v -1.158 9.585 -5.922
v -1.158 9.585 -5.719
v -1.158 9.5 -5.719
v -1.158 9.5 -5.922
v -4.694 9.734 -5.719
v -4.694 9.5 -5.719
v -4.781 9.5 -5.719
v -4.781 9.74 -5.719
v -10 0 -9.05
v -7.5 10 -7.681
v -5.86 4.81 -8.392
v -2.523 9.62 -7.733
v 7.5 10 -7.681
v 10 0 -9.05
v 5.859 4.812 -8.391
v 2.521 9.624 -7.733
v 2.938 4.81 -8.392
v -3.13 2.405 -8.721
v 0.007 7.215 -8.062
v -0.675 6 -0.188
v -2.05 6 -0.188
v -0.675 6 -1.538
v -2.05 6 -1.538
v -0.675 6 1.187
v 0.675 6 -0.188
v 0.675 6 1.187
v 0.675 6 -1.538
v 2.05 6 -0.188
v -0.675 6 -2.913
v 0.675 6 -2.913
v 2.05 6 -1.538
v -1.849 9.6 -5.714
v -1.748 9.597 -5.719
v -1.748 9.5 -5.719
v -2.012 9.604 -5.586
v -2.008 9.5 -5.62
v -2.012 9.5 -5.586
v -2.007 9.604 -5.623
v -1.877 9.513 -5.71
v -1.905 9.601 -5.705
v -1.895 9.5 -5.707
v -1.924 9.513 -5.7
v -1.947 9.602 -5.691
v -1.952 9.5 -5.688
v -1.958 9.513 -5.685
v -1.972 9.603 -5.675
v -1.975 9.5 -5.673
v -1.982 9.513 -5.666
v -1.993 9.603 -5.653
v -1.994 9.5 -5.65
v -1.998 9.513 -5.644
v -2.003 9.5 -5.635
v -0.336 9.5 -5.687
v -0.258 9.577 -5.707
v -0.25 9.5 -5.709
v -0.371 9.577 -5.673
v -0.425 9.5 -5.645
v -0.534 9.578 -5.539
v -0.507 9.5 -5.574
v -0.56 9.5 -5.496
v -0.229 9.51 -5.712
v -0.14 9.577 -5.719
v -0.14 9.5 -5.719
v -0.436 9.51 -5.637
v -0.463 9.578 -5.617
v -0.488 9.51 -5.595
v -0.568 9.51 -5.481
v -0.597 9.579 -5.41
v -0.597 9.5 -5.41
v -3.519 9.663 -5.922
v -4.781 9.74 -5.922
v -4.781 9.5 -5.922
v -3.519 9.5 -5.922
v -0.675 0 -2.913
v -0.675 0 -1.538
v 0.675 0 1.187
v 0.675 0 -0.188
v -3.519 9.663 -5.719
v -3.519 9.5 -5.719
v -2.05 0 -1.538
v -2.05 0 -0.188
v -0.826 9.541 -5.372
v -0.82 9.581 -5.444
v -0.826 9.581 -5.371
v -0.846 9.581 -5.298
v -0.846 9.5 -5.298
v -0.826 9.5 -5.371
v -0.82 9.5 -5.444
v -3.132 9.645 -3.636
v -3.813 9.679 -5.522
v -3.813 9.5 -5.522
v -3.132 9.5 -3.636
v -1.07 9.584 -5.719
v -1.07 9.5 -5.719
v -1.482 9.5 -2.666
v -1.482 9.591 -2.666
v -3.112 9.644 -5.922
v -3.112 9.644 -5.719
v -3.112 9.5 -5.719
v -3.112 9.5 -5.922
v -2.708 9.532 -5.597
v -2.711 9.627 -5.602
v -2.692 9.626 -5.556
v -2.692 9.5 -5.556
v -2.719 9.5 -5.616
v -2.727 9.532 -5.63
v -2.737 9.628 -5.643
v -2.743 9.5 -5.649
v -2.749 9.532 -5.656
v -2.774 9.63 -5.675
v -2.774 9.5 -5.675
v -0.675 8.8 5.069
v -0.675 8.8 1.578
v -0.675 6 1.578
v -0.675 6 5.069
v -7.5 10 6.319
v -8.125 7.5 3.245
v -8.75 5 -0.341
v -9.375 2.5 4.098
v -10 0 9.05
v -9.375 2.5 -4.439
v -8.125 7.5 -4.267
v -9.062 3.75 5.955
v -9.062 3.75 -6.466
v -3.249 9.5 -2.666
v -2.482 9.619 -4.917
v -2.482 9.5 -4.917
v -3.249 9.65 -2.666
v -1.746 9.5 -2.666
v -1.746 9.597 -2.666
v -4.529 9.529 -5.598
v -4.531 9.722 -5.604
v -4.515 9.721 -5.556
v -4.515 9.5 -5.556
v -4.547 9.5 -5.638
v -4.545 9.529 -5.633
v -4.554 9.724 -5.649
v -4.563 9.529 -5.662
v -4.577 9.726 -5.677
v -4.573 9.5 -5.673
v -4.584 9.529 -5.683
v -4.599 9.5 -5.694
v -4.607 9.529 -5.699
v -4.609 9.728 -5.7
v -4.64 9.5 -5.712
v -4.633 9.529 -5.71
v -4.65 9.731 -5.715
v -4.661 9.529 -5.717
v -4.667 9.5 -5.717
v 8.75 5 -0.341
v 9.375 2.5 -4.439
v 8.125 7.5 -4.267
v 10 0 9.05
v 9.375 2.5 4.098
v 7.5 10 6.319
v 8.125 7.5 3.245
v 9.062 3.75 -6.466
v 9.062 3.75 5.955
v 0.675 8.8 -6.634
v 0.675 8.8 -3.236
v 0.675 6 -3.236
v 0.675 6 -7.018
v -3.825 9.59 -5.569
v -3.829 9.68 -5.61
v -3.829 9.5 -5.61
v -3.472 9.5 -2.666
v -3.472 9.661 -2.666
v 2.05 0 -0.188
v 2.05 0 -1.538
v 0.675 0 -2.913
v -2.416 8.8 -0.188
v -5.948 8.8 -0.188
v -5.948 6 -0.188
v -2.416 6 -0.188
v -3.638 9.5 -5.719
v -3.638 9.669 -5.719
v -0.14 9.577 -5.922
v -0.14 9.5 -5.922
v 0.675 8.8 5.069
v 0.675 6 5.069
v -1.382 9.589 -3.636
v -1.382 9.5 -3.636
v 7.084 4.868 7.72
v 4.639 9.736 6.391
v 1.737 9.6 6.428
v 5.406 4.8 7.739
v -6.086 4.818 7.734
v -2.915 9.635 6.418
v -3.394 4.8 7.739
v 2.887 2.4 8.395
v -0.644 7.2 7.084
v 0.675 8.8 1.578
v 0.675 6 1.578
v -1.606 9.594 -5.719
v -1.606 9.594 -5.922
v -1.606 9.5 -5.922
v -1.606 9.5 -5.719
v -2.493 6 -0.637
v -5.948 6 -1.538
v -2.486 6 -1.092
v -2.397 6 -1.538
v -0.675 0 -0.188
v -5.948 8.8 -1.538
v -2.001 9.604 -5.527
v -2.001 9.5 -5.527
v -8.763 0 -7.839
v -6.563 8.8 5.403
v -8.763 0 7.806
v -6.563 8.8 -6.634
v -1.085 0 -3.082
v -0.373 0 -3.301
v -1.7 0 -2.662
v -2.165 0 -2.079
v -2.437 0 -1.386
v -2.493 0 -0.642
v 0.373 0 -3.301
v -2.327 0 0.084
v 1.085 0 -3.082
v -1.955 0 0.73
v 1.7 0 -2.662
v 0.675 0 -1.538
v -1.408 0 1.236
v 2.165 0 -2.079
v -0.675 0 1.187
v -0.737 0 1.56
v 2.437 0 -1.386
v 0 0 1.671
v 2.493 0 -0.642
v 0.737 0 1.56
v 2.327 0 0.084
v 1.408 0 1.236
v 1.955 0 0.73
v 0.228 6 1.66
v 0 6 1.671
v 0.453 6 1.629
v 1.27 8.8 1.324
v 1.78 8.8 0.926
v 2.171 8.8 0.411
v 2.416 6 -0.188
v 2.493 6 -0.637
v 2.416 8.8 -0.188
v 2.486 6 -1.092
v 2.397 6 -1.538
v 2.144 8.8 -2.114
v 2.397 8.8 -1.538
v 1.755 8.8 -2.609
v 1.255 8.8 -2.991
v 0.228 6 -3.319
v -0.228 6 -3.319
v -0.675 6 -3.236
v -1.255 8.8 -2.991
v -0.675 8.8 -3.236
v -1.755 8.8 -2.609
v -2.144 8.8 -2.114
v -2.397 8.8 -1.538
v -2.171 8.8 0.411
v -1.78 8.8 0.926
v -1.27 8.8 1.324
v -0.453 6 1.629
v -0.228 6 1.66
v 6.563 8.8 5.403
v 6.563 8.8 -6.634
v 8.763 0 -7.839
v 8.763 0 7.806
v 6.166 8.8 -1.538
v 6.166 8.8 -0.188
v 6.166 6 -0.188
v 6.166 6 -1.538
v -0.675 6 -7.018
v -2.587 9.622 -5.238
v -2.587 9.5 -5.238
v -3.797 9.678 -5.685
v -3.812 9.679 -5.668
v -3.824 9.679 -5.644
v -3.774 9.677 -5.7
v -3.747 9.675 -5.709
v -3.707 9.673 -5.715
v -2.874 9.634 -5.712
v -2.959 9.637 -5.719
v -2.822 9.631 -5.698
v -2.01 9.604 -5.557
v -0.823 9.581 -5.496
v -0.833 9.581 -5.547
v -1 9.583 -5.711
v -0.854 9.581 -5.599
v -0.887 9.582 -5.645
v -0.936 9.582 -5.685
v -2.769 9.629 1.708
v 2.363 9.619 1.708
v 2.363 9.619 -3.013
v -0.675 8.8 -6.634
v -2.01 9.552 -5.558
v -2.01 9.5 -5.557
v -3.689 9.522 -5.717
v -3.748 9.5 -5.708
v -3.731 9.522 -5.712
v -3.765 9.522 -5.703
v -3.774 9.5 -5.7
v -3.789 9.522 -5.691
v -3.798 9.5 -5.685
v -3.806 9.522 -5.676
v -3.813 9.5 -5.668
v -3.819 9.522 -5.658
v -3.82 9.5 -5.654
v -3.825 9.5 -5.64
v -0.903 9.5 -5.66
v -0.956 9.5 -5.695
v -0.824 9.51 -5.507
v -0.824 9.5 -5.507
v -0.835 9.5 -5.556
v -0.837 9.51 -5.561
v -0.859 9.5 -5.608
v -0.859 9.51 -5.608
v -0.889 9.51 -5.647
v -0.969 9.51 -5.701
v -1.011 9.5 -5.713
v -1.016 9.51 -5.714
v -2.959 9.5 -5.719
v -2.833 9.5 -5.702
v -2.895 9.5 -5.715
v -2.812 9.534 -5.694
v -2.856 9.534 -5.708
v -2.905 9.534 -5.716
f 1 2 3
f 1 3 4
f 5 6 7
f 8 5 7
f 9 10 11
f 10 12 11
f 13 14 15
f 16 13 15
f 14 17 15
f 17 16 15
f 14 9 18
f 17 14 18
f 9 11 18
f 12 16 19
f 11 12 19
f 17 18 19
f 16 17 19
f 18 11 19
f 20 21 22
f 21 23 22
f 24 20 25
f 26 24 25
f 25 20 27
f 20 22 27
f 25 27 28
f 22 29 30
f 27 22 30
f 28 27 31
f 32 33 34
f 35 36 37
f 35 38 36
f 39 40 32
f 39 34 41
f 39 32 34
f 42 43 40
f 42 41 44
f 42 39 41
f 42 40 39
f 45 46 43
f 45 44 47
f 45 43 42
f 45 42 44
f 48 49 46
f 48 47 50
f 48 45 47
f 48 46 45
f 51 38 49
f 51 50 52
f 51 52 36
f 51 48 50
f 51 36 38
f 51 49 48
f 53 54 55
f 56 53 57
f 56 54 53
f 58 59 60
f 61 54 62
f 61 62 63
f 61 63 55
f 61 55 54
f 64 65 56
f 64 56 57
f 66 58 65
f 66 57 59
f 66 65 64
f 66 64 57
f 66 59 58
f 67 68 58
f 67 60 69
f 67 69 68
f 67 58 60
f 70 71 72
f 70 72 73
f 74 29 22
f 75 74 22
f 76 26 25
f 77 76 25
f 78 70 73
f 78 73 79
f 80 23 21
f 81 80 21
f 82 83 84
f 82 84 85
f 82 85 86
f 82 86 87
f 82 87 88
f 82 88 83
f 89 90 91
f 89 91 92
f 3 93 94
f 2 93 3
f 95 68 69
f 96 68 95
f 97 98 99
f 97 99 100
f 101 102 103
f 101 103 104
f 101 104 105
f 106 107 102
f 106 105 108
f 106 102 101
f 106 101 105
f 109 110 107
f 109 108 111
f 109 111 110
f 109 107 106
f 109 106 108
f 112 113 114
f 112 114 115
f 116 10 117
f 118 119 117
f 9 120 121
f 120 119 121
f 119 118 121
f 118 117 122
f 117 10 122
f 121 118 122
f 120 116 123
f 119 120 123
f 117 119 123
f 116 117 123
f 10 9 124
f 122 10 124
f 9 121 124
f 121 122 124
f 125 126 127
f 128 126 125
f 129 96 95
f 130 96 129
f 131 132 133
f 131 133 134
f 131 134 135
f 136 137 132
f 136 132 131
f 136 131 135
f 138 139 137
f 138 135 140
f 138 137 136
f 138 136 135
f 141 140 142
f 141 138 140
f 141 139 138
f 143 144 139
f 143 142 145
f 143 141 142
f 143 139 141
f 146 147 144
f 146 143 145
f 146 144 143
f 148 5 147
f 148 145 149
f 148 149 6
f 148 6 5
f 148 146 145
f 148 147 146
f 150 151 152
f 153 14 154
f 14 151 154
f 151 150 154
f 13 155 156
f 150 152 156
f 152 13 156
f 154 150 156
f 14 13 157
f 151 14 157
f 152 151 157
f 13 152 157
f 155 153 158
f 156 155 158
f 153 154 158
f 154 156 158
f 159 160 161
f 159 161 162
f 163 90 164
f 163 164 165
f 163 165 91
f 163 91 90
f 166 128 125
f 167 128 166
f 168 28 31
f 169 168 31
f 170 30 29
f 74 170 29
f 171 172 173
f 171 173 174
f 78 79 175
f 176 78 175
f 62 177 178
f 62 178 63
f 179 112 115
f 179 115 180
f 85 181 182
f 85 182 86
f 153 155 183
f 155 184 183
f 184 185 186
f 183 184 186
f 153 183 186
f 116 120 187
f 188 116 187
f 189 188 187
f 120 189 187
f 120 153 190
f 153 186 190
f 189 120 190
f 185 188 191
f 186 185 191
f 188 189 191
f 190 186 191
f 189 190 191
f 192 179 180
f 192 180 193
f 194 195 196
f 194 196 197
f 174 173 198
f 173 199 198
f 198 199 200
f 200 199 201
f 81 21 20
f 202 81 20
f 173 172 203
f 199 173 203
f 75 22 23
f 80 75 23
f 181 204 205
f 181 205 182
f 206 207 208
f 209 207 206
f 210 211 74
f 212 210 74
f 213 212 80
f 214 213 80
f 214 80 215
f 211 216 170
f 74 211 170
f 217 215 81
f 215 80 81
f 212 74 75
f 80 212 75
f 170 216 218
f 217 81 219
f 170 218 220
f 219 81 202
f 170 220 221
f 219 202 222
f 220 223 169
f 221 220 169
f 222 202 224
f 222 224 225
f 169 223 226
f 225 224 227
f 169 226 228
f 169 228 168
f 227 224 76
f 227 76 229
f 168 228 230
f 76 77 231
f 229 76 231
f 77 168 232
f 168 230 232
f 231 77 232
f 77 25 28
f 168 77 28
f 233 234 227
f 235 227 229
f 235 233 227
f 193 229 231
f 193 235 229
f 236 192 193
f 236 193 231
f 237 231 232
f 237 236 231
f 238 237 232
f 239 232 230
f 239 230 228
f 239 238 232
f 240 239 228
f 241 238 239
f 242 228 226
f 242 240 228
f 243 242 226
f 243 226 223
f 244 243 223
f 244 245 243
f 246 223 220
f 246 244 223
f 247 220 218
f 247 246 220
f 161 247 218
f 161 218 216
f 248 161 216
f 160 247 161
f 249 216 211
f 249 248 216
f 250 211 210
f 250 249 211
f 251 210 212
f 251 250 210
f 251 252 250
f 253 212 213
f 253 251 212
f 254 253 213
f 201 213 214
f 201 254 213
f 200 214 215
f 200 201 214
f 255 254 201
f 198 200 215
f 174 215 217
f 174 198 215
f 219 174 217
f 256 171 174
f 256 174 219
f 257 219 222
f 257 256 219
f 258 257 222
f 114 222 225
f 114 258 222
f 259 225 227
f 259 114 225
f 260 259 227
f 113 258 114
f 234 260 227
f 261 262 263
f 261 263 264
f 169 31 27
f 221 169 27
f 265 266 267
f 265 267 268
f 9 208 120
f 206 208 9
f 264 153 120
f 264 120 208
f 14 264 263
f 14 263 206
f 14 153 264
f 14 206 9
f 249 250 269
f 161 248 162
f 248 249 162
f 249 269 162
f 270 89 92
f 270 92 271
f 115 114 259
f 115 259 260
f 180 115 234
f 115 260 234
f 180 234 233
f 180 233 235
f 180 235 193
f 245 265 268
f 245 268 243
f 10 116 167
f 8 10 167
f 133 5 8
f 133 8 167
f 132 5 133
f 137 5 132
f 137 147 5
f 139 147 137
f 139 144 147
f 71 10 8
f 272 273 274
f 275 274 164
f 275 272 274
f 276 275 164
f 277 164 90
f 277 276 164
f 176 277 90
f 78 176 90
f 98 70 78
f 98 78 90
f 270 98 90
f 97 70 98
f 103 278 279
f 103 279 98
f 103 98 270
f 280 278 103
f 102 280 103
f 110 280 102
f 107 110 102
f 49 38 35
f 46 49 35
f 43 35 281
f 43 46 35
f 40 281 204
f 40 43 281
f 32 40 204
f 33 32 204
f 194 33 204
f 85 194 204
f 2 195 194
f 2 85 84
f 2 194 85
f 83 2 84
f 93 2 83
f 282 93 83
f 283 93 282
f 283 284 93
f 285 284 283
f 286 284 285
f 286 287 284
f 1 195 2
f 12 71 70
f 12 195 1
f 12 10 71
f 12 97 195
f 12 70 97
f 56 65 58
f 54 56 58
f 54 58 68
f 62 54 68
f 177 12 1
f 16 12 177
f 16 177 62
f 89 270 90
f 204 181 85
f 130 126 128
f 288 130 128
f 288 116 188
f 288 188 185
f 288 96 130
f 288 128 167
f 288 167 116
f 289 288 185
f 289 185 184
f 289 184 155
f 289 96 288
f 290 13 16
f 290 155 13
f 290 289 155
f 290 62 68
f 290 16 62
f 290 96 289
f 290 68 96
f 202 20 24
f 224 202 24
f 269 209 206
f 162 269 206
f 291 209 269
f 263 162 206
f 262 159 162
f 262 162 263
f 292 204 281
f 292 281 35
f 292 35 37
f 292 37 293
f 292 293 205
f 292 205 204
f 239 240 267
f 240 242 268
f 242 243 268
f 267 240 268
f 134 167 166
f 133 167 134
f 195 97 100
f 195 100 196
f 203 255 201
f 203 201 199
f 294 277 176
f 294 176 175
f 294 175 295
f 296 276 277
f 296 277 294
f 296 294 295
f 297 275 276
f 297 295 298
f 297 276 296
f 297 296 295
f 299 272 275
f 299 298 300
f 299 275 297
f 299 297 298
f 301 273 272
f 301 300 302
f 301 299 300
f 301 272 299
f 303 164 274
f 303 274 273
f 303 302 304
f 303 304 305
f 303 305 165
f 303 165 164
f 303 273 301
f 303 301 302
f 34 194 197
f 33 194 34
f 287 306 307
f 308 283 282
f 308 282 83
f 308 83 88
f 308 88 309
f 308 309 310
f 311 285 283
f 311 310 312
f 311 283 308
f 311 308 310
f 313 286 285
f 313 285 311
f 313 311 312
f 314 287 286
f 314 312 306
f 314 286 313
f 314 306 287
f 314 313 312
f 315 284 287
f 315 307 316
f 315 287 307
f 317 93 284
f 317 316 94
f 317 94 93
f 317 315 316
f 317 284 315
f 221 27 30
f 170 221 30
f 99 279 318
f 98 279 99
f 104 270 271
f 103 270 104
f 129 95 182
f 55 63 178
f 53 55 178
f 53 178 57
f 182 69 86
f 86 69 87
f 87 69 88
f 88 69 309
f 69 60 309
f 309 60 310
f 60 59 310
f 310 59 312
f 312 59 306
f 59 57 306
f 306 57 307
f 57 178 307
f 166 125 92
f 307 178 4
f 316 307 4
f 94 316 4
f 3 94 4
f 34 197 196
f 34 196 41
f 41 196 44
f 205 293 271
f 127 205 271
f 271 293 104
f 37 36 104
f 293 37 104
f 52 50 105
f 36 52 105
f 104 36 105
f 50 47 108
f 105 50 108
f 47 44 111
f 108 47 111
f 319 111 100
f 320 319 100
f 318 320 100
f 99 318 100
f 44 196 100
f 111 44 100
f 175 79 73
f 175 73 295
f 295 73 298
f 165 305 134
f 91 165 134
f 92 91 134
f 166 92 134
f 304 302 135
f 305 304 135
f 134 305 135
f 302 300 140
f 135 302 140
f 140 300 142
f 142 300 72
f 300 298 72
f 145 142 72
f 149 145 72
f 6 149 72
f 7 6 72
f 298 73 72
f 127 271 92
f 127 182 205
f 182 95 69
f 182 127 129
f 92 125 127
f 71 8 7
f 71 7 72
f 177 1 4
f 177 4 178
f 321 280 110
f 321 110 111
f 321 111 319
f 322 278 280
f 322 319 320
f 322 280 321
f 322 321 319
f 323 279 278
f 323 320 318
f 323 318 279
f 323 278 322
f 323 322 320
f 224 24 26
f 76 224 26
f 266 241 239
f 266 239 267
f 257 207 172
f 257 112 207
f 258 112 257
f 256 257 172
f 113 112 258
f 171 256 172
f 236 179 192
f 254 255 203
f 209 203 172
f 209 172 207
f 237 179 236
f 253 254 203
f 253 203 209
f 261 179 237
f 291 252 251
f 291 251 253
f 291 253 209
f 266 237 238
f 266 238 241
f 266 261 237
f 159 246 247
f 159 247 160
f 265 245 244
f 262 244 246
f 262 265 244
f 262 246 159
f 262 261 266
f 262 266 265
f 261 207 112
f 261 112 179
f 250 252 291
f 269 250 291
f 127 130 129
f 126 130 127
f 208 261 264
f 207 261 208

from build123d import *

# Parameters (mm, degrees)
SHELL1_T                = -1.2
SKETCH5_W               = 1.35
SKETCH5_H               = 5.256968873
SKETCH5_H_2             = 1.35
SKETCH5_W_2             = 5.491330354
SKETCH5_W_3             = 5.273072972
SKETCH5_H_3             = 5.618351113
BOSS_EXTRUDE1_DEPTH     = 4
SKETCH6_R               = 2.5
BOSS_EXTRUDE2_DEPTH     = 10
CUT_EXTRUDE3_DEPTH      = 10
CUT_EXTRUDE3_DEPTH_BACK = 10
CUT_EXTRUDE4_DEPTH      = 0.5


with BuildPart() as part:
    # Loft1: read off the stored shape, not the designer's step
    # Loft1: loft between two sections, ruled curve by curve
    loft1_from = [
        Edge.make_line((-10, 0, 9.05), (-10, 0, -9.05)),
        Edge.make_line((-10, 0, -9.05), (10, 0, -9.05)),
        Edge.make_line((10, 0, 9.05), (-10, 0, 9.05)),
        Edge.make_line((10, 0, -9.05), (10, 0, 9.05)),
    ]
    loft1_to = [
        Edge.make_line((-7.5, 10, 6.318777005), (-7.5, 10, -7.681222995)),
        Edge.make_line((-7.5, 10, -7.681222995), (7.5, 10, -7.681222995)),
        Edge.make_line((7.5, 10, 6.318777005), (-7.5, 10, 6.318777005)),
        Edge.make_line((7.5, 10, -7.681222995), (7.5, 10, 6.318777005)),
    ]
    loft1 = Solid(Shell([*[Face.make_surface_from_curves(loft1_from[k], loft1_to[k]) for k in range(4)], Face(Wire(loft1_from)), Face(Wire(loft1_to))]))
    add(loft1)

    # Shell1
    shell1_openings = [part.faces().sort_by_distance(p)[0] for p in [
        (0, 0, 0),
    ]]
    offset(amount=SHELL1_T, openings=shell1_openings, kind=Kind.INTERSECTION)

    # Sketch5 → Boss-Extrude1 (add)
    with BuildSketch(Plane(origin=(0, 10, 0), x_dir=(1, 0, 0), z_dir=(0, 1, 0))):
        with Locations((0, -2.44038684)):
            Rectangle(SKETCH5_W, SKETCH5_H)
        with Locations((0, 0.863097596)):
            Rectangle(SKETCH5_W, SKETCH5_H_2)
        with Locations((3.420665177, 0.863097596)):
            Rectangle(SKETCH5_W_2, SKETCH5_H_2)
        with Locations((-3.311536486, 0.863097596)):
            Rectangle(SKETCH5_W_3, SKETCH5_H_2)
        with Locations((0, 4.347273152)):
            Rectangle(SKETCH5_W, SKETCH5_H_3)
    extrude(amount=-BOSS_EXTRUDE1_DEPTH)

    # Sketch6 → Boss-Extrude2 (add)
    with BuildSketch(Plane(origin=(0, 10, 0), x_dir=(1, 0, 0), z_dir=(0, 1, 0))):
        with Locations(Location((0, 0.829201721, 0), (0, 0, 270))):
            Circle(SKETCH6_R)
        Polygon((-0.675, 2.913097596), (-0.675, 1.538097596), (-2.05, 1.538097596), (-2.05, 0.188097596), (-0.675, 0.188097596), (-0.675, -1.186902404), (0.675, -1.186902404), (0.675, 0.188097596), (2.05, 0.188097596), (2.05, 1.538097596), (0.675, 1.538097596), (0.675, 2.913097596), align=None, mode=Mode.SUBTRACT)
    extrude(amount=-BOSS_EXTRUDE2_DEPTH)

    # Sketch4 → Cut-Extrude3 (cut, two sides: drawn at the far end of the back side and taken through both)
    with BuildSketch(Plane.XY.offset(-CUT_EXTRUDE3_DEPTH_BACK)):
        with BuildLine():
            Line((-7.5, 10), (7.5, 10))
            add(Edge.make_bspline(
                [(-7.5, 10), (-3.102300298, 9.460265696), (2.493912061, 9.41154423), (7.5, 10)],
                knots=[0, 0, 0, 0, 1, 1, 1, 1], degree=3))
        make_face()
    extrude(amount=CUT_EXTRUDE3_DEPTH + CUT_EXTRUDE3_DEPTH_BACK, mode=Mode.SUBTRACT)

    # Sketch7 → Cut-Extrude4 (cut)
    with BuildSketch(Plane(origin=(0, 10, 0), x_dir=(1, 0, 0), z_dir=(0, 1, 0))):
        with BuildLine():
            Line((-4.780864366, 5.922144036), (-3.519005391, 5.922144036))
            Line((-3.519005391, 5.922144036), (-3.519005391, 5.718618395))
            Line((-3.519005391, 5.718618395), (-3.637940688, 5.718618395))
            add(Edge.make_bspline(
                [(-3.637940688, 5.718618395), (-3.655135293, 5.718298675), (-3.686433195, 5.717716715), (-3.729006145, 5.712612802), (-3.763096016, 5.705393375), (-3.78881293, 5.692977812), (-3.8070942, 5.676915533), (-3.819447693, 5.657684085), (-3.827587368, 5.635286205), (-3.828346031, 5.619053057), (-3.828745976, 5.610495398)],
                knots=[0, 0, 0, 0, 1.655695587, 3.013724266, 4.12842979, 4.996263288, 5.734172721, 6.442363129, 7.178857587, 8, 8, 8, 8], degree=3))
            add(Edge.make_bspline(
                [(-3.828745976, 5.610495398), (-3.827935202, 5.596638054), (-3.8261785, 5.566613383), (-3.81792552, 5.537672623), (-3.813481553, 5.522088947)],
                knots=[0, 0, 0, 0, 0.92306383, 2, 2, 2, 2], degree=3))
            Line((-3.813481553, 5.522088947), (-3.132306673, 3.635660662))
            Line((-3.132306673, 3.635660662), (-2.586603548, 5.238425085))
            Line((-2.586603548, 5.238425085), (-2.691546457, 5.556433899))
            add(Edge.make_bspline(
                [(-2.691546457, 5.556433899), (-2.696705028, 5.569949091), (-2.7064075, 5.595369072), (-2.725520717, 5.629084688), (-2.747885349, 5.656076509), (-2.765681383, 5.669109501), (-2.774228749, 5.675369196)],
                knots=[0, 0, 0, 0, 1.175505941, 2.210944564, 3.140723652, 4, 4, 4, 4], degree=3))
            add(Edge.make_bspline(
                [(-2.774228749, 5.675369196), (-2.786526434, 5.682223978), (-2.812224647, 5.696548271), (-2.856749443, 5.708822147), (-2.906166524, 5.717600207), (-2.941028957, 5.718268145), (-2.959309879, 5.718618395)],
                knots=[0, 0, 0, 0, 0.875237679, 1.828965724, 2.861568027, 4, 4, 4, 4], degree=3))
            Line((-2.959309879, 5.718618395), (-3.111954109, 5.718618395))
            Line((-3.111954109, 5.718618395), (-3.111954109, 5.922144036))
            Line((-3.111954109, 5.922144036), (-1.605864366, 5.922144036))
            Line((-1.605864366, 5.922144036), (-1.605864366, 5.718618395))
            Line((-1.605864366, 5.718618395), (-1.747696297, 5.718618395))
            add(Edge.make_bspline(
                [(-1.747696297, 5.718618395), (-1.771456323, 5.718378199), (-1.814841431, 5.717939609), (-1.873911631, 5.711930572), (-1.920702063, 5.701790817), (-1.956628554, 5.687304501), (-1.982034107, 5.667479747), (-1.999396203, 5.643840507), (-2.011010812, 5.616593715), (-2.011847895, 5.596625547), (-2.01227963, 5.586326728)],
                knots=[0, 0, 0, 0, 1.714148818, 3.129985267, 4.276727023, 5.160657128, 5.901376261, 6.568437672, 7.261654719, 8, 8, 8, 8], degree=3))
            add(Edge.make_bspline(
                [(-2.01227963, 5.586326728), (-2.011825699, 5.576716145), (-2.010872101, 5.556526669), (-2.004700913, 5.537268169), (-2.001467331, 5.527177089)],
                knots=[0, 0, 0, 0, 0.952038799, 2, 2, 2, 2], degree=3))
            Line((-2.001467331, 5.527177089), (-1.381986161, 3.635660662))
            Line((-1.381986161, 3.635660662), (-0.8458233, 5.297574725))
            add(Edge.make_bspline(
                [(-0.8458233, 5.297574725), (-0.838138315, 5.322184666), (-0.82318736, 5.370062717), (-0.820871874, 5.420152039), (-0.819746577, 5.444494797)],
                knots=[0, 0, 0, 0, 1.028026033, 2, 2, 2, 2], degree=3))
            add(Edge.make_bspline(
                [(-0.819746577, 5.444494797), (-0.820535966, 5.465347045), (-0.822026939, 5.50473212), (-0.834869187, 5.560235902), (-0.856422532, 5.608480656), (-0.887535554, 5.648134893), (-0.924858201, 5.68006508), (-0.968418499, 5.702501412), (-1.017345761, 5.71638575), (-1.051795947, 5.717854835), (-1.069701505, 5.718618395)],
                knots=[0, 0, 0, 0, 1.192510613, 2.252376767, 3.240823701, 4.19251923, 5.11409438, 6.031584123, 6.976911646, 8, 8, 8, 8], degree=3))
            Line((-1.069701505, 5.718618395), (-1.158107956, 5.718618395))
            Line((-1.158107956, 5.718618395), (-1.158107956, 5.922144036))
            Line((-1.158107956, 5.922144036), (-0.14047975, 5.922144036))
            Line((-0.14047975, 5.922144036), (-0.14047975, 5.718618395))
            add(Edge.make_bspline(
                [(-0.14047975, 5.718618395), (-0.17000843, 5.716943894), (-0.226076597, 5.713764403), (-0.305801986, 5.6989593), (-0.375631822, 5.673331733), (-0.436896235, 5.639267674), (-0.489536795, 5.595758006), (-0.533856822, 5.542629255), (-0.570593733, 5.479973415), (-0.588077676, 5.433567924), (-0.597140407, 5.409513827)],
                knots=[0, 0, 0, 0, 1.193473395, 2.266131314, 3.259941233, 4.183600984, 5.083354208, 6.00064656, 6.963643304, 8, 8, 8, 8], degree=3))
            Line((-0.597140407, 5.409513827), (-1.482476946, 2.665733779))
            Line((-1.482476946, 2.665733779), (-1.745788244, 2.665733779))
            Line((-1.745788244, 2.665733779), (-2.482296657, 4.917236183))
            Line((-2.482296657, 4.917236183), (-3.249333917, 2.665733779))
            Line((-3.249333917, 2.665733779), (-3.471940087, 2.665733779))
            Line((-3.471940087, 2.665733779), (-4.515008997, 5.556433899))
            add(Edge.make_bspline(
                [(-4.515008997, 5.556433899), (-4.51937065, 5.570536793), (-4.527519997, 5.596886752), (-4.543498142, 5.632455097), (-4.561438603, 5.66146931), (-4.582786932, 5.683346509), (-4.606156722, 5.69999819), (-4.632897529, 5.710346771), (-4.662128217, 5.718097638), (-4.682858161, 5.718439241), (-4.693729951, 5.718618395)],
                knots=[0, 0, 0, 0, 1.34073981, 2.505048815, 3.536764225, 4.422637444, 5.267304403, 6.122676221, 7.015440249, 8, 8, 8, 8], degree=3))
            Line((-4.693729951, 5.718618395), (-4.780864366, 5.718618395))
            Line((-4.780864366, 5.718618395), (-4.780864366, 5.922144036))
        make_face()
    extrude(amount=-CUT_EXTRUDE4_DEPTH, mode=Mode.SUBTRACT)


solid = part.part
